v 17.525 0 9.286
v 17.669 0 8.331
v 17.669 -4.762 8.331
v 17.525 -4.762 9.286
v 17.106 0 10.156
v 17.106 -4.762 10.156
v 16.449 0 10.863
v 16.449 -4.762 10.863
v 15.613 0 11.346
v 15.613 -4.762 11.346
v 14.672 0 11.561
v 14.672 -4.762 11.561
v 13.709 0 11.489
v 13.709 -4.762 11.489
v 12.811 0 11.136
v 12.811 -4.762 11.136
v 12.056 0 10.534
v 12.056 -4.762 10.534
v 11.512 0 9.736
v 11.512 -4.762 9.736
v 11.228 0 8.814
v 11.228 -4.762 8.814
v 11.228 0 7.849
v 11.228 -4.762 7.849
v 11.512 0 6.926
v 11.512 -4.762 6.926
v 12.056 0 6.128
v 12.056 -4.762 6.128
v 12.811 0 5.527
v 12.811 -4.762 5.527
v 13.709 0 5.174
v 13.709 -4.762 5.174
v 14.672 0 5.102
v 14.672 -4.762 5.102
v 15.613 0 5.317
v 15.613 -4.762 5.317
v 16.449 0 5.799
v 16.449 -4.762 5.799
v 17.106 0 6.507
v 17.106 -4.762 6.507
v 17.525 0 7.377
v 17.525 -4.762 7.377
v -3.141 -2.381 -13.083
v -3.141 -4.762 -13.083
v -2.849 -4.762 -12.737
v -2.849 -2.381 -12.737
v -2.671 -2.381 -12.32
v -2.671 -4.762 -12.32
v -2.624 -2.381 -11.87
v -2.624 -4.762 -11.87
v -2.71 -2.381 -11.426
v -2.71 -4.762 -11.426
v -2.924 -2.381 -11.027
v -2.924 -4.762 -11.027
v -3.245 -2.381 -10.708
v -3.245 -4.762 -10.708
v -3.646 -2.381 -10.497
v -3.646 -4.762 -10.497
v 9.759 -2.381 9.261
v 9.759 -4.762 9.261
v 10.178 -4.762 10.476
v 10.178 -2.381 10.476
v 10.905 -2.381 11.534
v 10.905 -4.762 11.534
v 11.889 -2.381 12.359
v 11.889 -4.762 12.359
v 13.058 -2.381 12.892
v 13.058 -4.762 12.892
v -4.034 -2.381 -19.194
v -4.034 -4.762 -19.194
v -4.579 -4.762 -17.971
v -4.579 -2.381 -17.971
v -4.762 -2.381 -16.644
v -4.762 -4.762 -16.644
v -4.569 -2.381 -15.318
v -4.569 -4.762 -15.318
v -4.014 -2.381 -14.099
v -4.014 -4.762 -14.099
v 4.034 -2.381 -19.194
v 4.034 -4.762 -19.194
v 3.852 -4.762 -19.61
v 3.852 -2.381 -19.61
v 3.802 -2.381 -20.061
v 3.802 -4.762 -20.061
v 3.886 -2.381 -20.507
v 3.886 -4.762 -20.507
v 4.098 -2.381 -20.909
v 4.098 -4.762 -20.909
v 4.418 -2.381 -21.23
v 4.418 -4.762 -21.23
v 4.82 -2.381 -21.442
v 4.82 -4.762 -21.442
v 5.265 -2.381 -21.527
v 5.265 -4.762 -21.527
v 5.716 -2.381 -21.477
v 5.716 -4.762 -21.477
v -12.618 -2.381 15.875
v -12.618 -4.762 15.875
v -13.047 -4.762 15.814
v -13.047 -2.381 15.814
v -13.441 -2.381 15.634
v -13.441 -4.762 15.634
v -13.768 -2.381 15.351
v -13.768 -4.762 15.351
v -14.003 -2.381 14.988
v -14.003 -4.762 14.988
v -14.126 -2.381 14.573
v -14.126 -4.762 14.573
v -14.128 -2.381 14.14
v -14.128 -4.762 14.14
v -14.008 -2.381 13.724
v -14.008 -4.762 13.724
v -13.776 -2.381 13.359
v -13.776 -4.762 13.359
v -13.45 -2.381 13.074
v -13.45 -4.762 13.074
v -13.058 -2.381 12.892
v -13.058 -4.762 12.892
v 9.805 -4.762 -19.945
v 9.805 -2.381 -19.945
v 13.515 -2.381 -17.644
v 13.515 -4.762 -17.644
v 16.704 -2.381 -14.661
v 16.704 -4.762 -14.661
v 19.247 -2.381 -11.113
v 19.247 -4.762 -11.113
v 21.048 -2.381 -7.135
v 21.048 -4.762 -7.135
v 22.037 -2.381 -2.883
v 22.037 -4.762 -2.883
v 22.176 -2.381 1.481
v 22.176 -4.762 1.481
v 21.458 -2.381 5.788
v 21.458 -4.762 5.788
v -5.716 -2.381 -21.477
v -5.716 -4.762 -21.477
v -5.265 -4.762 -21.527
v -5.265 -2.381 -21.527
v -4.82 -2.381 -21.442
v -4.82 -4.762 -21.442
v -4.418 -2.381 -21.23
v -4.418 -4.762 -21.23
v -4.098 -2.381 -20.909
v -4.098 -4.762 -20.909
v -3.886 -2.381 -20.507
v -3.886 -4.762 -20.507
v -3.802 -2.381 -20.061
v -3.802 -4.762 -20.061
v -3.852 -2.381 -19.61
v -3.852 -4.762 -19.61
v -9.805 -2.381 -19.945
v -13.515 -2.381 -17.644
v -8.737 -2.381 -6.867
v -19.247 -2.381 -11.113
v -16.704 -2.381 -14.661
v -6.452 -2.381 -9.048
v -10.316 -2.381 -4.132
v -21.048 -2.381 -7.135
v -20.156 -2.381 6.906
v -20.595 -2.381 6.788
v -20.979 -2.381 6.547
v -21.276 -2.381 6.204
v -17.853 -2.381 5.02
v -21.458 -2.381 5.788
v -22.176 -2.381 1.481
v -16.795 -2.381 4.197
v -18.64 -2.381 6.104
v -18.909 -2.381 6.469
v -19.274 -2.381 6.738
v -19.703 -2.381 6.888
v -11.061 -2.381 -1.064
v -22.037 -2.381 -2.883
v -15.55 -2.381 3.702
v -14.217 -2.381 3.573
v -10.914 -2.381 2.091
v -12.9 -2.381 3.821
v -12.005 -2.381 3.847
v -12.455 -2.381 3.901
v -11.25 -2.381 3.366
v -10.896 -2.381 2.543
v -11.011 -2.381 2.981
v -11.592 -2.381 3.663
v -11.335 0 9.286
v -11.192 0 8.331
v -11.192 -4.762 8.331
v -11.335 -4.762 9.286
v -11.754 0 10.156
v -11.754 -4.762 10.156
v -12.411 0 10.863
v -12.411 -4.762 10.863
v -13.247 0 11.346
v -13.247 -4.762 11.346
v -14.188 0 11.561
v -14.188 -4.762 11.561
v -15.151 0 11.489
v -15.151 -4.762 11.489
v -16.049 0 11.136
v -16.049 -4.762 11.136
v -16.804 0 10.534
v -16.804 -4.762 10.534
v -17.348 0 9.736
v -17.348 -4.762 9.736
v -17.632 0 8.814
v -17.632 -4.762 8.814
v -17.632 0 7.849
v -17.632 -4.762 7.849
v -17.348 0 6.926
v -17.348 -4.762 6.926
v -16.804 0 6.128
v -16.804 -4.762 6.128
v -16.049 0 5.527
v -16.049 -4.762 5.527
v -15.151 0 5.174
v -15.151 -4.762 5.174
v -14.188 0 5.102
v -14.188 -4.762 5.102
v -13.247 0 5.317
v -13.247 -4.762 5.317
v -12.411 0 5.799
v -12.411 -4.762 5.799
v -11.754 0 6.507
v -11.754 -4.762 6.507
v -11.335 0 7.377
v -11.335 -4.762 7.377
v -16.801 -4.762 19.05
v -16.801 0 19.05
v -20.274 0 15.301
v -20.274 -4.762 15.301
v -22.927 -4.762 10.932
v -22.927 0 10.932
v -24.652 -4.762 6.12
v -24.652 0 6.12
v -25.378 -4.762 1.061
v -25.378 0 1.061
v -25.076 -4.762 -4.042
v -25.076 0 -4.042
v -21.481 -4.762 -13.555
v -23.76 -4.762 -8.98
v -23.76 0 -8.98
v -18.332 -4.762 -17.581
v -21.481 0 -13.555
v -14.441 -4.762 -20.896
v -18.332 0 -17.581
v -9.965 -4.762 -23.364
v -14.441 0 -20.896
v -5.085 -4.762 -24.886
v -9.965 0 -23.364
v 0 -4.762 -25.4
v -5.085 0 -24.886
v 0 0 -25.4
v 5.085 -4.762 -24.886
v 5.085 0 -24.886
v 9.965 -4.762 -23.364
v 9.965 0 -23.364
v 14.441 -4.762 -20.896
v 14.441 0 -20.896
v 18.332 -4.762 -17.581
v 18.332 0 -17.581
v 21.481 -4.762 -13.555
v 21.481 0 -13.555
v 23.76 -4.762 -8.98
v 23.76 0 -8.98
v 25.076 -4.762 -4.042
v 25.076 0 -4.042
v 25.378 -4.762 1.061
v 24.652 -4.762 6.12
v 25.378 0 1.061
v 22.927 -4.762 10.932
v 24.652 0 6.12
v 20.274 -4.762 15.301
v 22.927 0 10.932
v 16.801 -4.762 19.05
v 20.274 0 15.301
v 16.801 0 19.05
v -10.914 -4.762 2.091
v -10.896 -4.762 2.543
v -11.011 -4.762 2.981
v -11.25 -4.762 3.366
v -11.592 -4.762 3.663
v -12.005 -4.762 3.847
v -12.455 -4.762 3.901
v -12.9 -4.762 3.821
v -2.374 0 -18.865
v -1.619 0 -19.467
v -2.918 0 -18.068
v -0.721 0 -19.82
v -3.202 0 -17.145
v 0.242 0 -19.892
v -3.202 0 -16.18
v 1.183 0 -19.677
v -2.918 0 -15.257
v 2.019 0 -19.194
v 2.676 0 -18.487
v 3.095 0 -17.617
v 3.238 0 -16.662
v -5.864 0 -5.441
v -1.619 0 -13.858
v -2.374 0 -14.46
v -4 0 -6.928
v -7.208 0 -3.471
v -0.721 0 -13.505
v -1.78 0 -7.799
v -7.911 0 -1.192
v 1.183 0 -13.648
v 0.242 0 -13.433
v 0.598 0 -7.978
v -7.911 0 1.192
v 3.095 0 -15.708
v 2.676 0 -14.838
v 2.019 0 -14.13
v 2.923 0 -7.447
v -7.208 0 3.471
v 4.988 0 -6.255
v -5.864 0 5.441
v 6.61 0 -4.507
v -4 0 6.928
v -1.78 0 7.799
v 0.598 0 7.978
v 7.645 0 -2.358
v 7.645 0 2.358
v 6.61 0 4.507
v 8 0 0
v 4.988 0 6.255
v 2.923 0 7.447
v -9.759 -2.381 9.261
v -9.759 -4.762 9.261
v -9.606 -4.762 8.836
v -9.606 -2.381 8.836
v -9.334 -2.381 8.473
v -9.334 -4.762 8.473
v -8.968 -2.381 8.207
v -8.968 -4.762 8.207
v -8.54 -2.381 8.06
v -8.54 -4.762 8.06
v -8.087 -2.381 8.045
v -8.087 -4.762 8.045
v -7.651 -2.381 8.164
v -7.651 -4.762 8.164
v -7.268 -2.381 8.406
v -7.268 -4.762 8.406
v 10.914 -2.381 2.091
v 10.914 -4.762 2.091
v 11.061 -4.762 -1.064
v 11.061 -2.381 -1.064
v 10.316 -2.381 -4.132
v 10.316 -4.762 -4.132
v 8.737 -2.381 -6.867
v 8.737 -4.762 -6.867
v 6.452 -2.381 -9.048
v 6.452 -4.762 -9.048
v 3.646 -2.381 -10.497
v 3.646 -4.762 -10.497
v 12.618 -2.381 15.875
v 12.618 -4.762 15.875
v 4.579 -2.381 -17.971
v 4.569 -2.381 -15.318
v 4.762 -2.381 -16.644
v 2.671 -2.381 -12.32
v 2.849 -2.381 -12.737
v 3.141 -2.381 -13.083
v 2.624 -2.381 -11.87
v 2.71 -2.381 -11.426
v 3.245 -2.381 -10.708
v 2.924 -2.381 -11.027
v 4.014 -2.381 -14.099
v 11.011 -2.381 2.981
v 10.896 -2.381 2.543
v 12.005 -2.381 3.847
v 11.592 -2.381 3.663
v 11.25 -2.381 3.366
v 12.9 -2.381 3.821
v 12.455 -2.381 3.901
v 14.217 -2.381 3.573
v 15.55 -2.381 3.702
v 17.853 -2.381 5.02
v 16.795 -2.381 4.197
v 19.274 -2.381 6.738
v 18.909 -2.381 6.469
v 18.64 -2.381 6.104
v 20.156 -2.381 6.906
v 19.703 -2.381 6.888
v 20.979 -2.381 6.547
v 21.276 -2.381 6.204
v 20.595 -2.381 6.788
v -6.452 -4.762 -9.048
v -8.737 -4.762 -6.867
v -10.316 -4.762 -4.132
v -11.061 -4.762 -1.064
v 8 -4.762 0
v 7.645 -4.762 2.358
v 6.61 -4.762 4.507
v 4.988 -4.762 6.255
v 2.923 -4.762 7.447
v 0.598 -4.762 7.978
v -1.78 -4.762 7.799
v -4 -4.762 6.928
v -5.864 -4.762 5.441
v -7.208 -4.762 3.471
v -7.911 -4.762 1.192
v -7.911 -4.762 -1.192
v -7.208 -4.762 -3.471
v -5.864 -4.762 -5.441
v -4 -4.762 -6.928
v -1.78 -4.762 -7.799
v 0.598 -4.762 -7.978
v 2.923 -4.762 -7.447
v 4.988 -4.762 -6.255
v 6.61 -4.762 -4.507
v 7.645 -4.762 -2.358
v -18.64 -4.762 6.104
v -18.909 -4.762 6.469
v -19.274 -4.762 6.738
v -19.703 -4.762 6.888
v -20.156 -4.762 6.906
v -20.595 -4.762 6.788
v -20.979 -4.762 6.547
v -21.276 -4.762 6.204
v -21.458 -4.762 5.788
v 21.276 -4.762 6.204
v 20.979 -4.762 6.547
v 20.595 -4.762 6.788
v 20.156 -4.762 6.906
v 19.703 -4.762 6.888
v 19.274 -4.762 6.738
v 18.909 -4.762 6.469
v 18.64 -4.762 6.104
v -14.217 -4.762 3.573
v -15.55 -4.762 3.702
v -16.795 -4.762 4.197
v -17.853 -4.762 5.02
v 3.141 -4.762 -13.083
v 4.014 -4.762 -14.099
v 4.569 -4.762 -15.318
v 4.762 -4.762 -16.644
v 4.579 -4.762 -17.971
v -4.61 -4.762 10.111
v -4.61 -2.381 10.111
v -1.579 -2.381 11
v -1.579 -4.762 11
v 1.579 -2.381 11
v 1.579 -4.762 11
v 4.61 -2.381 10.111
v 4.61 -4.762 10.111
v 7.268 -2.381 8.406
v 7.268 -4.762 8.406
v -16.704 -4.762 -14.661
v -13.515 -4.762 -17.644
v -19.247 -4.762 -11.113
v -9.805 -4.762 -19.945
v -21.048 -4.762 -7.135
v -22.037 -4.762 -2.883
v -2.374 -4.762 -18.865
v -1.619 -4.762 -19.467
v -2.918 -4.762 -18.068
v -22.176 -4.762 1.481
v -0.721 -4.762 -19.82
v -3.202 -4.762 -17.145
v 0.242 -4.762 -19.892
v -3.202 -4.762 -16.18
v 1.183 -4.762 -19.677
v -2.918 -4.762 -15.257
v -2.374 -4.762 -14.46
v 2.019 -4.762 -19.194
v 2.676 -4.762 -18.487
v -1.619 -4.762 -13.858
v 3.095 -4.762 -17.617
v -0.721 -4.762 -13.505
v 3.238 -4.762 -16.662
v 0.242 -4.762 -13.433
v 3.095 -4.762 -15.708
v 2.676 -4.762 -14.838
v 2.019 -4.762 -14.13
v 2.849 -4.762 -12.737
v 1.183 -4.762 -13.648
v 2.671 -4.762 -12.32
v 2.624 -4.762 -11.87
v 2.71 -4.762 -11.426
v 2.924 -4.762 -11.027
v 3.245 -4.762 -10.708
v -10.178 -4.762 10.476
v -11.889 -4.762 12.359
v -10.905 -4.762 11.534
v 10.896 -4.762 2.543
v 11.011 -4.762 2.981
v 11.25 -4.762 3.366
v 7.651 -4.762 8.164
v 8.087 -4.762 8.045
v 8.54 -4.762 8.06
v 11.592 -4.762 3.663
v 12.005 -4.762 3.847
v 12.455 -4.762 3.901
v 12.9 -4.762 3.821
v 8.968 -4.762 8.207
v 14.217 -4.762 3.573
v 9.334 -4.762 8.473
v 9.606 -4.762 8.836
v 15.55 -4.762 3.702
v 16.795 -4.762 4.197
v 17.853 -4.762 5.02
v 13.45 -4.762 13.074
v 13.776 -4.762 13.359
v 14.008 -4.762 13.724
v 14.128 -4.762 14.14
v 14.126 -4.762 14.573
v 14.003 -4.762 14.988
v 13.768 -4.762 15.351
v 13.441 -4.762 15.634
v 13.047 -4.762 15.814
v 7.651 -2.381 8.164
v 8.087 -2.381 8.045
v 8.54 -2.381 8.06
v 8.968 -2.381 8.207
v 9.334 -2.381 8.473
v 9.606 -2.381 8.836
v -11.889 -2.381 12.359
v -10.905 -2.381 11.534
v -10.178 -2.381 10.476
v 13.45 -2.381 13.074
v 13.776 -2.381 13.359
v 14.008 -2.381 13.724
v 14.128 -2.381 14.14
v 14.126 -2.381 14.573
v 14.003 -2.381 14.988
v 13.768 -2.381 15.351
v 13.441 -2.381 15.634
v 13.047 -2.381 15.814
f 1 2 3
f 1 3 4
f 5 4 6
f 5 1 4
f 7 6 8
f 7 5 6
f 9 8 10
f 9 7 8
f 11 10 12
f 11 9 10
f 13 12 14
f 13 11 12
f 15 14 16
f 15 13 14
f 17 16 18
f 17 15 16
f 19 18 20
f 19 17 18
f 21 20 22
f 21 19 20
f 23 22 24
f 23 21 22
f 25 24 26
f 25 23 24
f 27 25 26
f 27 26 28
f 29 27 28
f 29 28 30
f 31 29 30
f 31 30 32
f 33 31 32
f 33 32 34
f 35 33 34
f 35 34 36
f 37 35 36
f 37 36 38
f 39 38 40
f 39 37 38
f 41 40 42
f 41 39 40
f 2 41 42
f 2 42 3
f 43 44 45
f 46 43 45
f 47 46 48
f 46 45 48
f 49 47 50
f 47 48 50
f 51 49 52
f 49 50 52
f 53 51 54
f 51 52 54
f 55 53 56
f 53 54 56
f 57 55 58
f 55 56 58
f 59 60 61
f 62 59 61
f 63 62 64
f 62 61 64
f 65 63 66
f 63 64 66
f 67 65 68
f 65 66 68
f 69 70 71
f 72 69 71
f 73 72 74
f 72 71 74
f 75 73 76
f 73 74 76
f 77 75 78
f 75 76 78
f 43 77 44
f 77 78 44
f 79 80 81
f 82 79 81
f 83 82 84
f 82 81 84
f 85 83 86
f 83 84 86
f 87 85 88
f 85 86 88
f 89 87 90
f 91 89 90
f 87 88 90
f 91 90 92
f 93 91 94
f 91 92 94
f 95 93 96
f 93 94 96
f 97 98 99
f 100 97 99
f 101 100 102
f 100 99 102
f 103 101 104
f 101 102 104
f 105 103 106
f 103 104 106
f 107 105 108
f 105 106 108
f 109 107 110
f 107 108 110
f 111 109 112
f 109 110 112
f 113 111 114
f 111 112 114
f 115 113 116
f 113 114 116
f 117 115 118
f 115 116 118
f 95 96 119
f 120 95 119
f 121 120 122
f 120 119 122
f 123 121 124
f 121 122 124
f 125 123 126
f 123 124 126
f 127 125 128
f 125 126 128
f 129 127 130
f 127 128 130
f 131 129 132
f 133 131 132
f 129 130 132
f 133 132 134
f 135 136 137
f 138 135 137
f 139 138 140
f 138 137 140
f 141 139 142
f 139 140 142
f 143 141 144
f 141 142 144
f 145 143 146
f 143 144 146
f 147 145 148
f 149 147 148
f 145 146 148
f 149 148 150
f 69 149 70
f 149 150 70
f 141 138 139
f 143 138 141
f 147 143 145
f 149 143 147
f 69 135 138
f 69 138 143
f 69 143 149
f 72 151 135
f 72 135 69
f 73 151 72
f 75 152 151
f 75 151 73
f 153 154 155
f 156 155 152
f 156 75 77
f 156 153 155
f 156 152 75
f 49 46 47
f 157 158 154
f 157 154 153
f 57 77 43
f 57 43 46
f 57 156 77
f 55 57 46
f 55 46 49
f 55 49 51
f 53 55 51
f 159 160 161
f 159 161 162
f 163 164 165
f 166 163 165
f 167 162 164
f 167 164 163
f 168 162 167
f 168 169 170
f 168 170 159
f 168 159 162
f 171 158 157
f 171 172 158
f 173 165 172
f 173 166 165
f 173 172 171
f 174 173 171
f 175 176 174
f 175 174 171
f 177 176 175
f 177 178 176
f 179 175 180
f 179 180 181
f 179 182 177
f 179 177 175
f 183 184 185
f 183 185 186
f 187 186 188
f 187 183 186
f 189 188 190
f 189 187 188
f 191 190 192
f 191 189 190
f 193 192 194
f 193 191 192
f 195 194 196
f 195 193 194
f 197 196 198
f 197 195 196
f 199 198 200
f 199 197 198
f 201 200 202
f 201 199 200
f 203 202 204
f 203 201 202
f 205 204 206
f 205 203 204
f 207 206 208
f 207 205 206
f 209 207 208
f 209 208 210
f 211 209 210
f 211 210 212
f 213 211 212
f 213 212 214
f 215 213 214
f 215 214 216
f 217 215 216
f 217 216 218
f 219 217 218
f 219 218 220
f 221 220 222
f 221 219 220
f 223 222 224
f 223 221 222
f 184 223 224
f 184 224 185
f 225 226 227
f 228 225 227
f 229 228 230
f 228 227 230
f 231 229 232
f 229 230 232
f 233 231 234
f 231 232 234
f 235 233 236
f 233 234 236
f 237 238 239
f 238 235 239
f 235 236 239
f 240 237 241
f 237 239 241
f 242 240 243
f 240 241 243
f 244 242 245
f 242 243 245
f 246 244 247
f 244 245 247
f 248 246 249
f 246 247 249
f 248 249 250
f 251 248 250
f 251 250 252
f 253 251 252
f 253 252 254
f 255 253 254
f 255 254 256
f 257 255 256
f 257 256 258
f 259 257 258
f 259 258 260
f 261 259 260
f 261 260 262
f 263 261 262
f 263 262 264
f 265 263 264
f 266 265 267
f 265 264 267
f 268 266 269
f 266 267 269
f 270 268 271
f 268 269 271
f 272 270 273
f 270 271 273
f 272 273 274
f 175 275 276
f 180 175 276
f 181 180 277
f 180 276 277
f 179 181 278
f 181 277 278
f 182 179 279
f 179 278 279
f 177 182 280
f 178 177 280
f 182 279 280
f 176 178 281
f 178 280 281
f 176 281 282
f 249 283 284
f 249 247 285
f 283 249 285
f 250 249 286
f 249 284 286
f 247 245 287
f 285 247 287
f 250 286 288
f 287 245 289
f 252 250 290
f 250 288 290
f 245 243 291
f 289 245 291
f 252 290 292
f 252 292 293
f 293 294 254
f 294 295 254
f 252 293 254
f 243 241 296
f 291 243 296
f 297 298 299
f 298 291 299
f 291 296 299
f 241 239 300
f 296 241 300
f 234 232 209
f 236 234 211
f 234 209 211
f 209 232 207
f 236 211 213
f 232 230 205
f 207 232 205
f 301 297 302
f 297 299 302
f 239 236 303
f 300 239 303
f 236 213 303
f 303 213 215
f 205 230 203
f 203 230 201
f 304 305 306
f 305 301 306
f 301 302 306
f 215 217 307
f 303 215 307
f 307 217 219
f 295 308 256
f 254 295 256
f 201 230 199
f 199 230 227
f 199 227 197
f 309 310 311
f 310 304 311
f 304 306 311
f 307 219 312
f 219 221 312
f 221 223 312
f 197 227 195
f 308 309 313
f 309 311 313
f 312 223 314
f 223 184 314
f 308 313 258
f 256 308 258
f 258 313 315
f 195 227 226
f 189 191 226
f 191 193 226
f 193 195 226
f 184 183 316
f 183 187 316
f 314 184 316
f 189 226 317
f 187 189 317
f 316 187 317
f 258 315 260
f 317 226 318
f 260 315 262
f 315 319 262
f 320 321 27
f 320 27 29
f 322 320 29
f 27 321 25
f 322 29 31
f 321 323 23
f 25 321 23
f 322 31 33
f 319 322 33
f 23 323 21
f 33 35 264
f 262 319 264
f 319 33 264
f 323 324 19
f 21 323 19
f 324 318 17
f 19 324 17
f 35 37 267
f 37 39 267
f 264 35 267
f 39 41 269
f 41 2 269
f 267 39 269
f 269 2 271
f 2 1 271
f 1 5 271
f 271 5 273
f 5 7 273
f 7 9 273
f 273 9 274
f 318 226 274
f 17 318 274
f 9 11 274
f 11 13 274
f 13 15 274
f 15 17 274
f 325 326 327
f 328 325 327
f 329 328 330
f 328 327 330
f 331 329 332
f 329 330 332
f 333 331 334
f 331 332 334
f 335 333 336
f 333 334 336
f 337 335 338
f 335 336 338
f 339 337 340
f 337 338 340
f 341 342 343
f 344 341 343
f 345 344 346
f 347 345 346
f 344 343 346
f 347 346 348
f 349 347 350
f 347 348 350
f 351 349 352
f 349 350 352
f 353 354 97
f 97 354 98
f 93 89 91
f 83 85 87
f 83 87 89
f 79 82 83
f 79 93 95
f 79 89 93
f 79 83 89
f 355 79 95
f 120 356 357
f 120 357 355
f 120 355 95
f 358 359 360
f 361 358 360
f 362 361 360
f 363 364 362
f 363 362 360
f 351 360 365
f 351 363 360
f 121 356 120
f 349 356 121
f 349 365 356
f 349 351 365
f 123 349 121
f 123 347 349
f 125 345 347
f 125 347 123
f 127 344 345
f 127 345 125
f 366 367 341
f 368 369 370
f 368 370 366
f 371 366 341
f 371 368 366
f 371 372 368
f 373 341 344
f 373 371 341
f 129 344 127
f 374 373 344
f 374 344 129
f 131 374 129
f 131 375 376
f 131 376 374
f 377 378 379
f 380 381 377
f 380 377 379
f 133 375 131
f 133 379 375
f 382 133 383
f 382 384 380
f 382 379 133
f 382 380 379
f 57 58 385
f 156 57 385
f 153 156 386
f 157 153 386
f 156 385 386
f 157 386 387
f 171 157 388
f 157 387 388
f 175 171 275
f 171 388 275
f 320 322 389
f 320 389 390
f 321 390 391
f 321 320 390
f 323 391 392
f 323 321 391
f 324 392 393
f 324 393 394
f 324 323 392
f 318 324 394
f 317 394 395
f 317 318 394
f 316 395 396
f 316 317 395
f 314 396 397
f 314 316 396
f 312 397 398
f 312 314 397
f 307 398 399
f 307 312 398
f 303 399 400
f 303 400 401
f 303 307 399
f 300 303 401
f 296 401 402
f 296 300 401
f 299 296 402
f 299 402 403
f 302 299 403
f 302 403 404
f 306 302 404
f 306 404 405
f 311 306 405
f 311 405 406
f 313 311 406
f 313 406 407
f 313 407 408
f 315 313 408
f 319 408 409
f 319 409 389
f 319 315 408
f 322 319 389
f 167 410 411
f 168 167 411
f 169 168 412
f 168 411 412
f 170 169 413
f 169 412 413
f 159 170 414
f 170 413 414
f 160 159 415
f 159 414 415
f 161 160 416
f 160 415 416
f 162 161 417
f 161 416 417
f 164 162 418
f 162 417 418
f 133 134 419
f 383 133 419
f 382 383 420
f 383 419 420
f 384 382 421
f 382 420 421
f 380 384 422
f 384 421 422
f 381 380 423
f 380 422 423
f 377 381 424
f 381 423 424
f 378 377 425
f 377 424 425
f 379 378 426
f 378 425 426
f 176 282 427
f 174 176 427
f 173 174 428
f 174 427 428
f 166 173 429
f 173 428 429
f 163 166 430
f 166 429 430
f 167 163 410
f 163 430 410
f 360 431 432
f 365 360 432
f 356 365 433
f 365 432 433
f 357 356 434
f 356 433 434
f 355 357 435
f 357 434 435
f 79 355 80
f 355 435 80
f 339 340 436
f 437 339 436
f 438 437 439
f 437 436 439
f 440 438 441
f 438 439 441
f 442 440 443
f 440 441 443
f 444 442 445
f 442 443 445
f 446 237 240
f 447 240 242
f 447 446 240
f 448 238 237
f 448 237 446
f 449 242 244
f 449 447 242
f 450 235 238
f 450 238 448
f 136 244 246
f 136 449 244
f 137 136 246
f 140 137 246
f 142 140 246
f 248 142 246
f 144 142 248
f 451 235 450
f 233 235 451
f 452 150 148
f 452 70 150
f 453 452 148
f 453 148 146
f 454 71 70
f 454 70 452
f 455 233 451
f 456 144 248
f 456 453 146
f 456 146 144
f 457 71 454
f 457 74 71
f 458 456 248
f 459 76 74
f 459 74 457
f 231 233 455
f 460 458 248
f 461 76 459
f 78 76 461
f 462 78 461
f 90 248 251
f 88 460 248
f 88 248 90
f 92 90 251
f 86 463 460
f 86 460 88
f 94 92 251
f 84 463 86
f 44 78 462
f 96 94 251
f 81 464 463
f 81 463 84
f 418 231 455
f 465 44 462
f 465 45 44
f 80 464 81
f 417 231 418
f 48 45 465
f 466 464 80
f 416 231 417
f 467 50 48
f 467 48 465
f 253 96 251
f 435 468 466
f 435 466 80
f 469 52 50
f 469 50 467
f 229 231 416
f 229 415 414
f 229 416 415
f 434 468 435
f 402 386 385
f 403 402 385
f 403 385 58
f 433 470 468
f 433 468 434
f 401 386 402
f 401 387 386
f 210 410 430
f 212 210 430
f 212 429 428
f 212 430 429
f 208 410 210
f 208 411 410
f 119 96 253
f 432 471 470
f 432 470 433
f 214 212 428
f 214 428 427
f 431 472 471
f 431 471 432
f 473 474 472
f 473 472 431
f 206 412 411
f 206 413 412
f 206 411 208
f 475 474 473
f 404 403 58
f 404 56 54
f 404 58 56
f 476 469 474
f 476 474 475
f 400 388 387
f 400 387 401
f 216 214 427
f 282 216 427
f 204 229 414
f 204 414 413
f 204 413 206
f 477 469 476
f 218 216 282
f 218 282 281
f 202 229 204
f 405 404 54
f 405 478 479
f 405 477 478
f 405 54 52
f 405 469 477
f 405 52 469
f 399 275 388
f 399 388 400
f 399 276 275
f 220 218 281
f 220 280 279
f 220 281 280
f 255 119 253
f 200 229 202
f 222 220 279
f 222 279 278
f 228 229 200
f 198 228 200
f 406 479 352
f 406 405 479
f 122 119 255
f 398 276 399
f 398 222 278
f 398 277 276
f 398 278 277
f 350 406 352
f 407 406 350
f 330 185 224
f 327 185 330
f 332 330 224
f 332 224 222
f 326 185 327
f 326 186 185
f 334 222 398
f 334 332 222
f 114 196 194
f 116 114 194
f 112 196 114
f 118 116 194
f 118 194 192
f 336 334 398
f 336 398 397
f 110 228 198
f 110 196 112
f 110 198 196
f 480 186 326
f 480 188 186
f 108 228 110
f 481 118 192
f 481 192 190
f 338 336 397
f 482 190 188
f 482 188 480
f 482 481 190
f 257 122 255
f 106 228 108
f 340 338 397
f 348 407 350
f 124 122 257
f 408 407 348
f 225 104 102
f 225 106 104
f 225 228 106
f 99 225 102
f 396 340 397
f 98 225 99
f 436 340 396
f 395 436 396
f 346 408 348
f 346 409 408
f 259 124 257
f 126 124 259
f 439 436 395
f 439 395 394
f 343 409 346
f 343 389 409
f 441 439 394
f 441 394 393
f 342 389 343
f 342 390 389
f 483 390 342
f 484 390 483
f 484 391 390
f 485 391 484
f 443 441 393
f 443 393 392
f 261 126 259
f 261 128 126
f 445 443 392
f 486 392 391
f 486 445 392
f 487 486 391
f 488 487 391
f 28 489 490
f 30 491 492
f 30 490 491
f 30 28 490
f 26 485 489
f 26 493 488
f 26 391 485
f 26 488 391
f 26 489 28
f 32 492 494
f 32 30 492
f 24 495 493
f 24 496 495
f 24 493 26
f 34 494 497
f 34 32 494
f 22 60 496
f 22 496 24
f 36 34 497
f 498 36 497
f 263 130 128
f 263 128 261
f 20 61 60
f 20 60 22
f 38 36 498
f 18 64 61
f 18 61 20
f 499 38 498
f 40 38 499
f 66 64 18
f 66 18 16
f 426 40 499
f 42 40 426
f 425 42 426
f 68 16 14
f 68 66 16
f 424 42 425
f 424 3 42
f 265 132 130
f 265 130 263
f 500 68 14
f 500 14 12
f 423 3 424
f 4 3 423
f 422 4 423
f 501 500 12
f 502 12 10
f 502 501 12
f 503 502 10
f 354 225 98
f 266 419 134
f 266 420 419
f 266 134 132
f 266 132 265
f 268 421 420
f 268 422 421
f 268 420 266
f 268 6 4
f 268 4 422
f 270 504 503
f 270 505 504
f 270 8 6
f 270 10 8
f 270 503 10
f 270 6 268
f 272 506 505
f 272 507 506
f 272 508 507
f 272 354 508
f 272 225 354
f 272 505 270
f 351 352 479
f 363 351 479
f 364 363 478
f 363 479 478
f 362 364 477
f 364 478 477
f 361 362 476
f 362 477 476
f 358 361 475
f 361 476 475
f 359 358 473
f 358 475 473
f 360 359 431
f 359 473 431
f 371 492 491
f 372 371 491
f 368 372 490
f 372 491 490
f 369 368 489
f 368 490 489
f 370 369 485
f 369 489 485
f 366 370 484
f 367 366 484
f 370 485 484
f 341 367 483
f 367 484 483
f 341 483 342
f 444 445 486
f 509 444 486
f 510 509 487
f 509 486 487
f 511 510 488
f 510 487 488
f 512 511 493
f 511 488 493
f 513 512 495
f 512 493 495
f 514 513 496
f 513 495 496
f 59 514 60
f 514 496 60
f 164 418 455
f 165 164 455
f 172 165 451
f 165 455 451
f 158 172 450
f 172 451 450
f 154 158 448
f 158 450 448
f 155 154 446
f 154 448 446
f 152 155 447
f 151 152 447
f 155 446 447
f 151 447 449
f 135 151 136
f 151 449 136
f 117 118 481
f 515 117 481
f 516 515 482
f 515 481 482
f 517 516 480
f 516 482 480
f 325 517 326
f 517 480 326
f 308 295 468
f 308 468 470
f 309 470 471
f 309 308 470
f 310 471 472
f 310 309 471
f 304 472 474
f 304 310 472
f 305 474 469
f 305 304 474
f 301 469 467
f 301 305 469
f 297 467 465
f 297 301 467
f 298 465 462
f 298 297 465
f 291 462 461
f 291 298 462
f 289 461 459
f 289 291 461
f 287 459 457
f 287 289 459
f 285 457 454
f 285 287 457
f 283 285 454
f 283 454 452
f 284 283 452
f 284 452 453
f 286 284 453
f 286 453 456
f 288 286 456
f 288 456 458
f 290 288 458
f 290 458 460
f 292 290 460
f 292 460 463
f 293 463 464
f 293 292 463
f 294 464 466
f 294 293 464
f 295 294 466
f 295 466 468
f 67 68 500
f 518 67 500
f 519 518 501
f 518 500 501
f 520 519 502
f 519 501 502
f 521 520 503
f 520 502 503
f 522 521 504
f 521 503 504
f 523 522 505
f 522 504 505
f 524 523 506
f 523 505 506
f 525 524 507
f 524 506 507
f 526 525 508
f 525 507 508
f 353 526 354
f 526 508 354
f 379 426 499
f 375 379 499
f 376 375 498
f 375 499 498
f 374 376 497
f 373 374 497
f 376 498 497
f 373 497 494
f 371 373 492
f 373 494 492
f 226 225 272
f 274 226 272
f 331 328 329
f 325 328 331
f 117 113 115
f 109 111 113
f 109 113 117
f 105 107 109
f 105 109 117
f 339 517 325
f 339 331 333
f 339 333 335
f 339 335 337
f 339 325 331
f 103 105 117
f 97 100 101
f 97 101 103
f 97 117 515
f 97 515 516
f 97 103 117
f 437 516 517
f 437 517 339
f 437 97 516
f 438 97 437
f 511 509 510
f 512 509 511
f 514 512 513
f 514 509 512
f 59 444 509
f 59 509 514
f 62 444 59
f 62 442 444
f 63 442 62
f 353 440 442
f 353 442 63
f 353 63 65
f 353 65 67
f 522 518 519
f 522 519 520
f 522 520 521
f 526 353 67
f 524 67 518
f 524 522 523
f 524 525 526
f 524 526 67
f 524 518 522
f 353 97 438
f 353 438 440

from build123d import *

# Parameters (mm, degrees)
F0_R     = 25.4
F0_R_2   = 3.2385
F0_R_3   = 8
F1_DEPTH = 4.7625
F2_W     = 50.561215
F2_H     = 14.34433
F3_DEPTH = 25.4
F5_DEPTH = 2.38125


with BuildPart() as f1:
    # F0 (on Front) → F1 (new body)
    with BuildSketch(Plane.XZ):
        Circle(F0_R)
        with Locations((0, -16.6624)):
            Circle(F0_R_2, mode=Mode.SUBTRACT)
        Circle(F0_R_3, mode=Mode.SUBTRACT)
        with Locations((-14.430062, 8.3312)):
            Circle(F0_R_2, mode=Mode.SUBTRACT)
        with Locations((14.430062, 8.3312)):
            Circle(F0_R_2, mode=Mode.SUBTRACT)
    extrude(amount=F1_DEPTH)

    # F2 (on face) → F3 (cut)
    with BuildSketch(Plane.XZ.offset(4.7625)):
        with Locations((0.75591, 26.222165)):
            Rectangle(F2_W, F2_H)
    extrude(amount=-F3_DEPTH, mode=Mode.SUBTRACT)

    # F4 (on face) → F5 (cut)
    with BuildSketch(Plane.XZ.offset(4.7625)):
        with BuildLine():
            ThreePointArc((-3.646079, -10.497322), (-9.623707, -5.55625), (-10.913987, 2.091064))
            ThreePointArc((-10.913987, 2.091064), (-11.409826, 3.527057), (-12.900289, 3.821078))
            ThreePointArc((-12.900289, 3.821078), (-16.190201, 3.905896), (-18.639619, 6.103863))
            ThreePointArc((-18.639619, 6.103863), (-20.156405, 6.905634), (-21.458089, 5.788007))
            ThreePointArc((-21.458089, 5.788007), (-19.247415, -11.1125), (-5.716484, -21.477254))
            ThreePointArc((-5.716484, -21.477254), (-4.097748, -20.908775), (-4.033709, -19.194315))
            ThreePointArc((-4.033709, -19.194315), (-4.712495, -15.974073), (-3.140994, -13.082517))
            ThreePointArc((-3.140994, -13.082517), (-2.650392, -11.644727), (-3.646079, -10.497322))
        make_face()
        with BuildLine():
            ThreePointArc((-7.267908, 8.406258), (0, 11.1125), (7.267908, 8.406258))
            ThreePointArc((7.267908, 8.406258), (8.759433, 8.11767), (9.759295, 9.261439))
            ThreePointArc((9.759295, 9.261439), (10.905182, 11.533797), (13.057597, 12.891655))
            ThreePointArc((13.057597, 12.891655), (14.126157, 14.572961), (12.618408, 15.875))
            Line((12.618408, 15.875), (-12.618408, 15.875))
            ThreePointArc((-12.618408, 15.875), (-14.126157, 14.572961), (-13.057597, 12.891655))
            ThreePointArc((-13.057597, 12.891655), (-10.905182, 11.533797), (-9.759295, 9.261439))
            ThreePointArc((-9.759295, 9.261439), (-8.759433, 8.11767), (-7.267908, 8.406258))
        make_face()
        with BuildLine():
            ThreePointArc((10.913987, 2.091064), (9.623707, -5.55625), (3.646079, -10.497322))
            ThreePointArc((3.646079, -10.497322), (2.650392, -11.644727), (3.140994, -13.082517))
            ThreePointArc((3.140994, -13.082517), (4.712495, -15.974073), (4.033709, -19.194315))
            ThreePointArc((4.033709, -19.194315), (4.097748, -20.908775), (5.716484, -21.477254))
            ThreePointArc((5.716484, -21.477254), (19.247415, -11.1125), (21.458089, 5.788007))
            ThreePointArc((21.458089, 5.788007), (20.156405, 6.905634), (18.639619, 6.103863))
            ThreePointArc((18.639619, 6.103863), (16.190201, 3.905896), (12.900289, 3.821078))
            ThreePointArc((12.900289, 3.821078), (11.409826, 3.527057), (10.913987, 2.091064))
        make_face()
    extrude(amount=-F5_DEPTH, mode=Mode.SUBTRACT)


solid = f1.part
